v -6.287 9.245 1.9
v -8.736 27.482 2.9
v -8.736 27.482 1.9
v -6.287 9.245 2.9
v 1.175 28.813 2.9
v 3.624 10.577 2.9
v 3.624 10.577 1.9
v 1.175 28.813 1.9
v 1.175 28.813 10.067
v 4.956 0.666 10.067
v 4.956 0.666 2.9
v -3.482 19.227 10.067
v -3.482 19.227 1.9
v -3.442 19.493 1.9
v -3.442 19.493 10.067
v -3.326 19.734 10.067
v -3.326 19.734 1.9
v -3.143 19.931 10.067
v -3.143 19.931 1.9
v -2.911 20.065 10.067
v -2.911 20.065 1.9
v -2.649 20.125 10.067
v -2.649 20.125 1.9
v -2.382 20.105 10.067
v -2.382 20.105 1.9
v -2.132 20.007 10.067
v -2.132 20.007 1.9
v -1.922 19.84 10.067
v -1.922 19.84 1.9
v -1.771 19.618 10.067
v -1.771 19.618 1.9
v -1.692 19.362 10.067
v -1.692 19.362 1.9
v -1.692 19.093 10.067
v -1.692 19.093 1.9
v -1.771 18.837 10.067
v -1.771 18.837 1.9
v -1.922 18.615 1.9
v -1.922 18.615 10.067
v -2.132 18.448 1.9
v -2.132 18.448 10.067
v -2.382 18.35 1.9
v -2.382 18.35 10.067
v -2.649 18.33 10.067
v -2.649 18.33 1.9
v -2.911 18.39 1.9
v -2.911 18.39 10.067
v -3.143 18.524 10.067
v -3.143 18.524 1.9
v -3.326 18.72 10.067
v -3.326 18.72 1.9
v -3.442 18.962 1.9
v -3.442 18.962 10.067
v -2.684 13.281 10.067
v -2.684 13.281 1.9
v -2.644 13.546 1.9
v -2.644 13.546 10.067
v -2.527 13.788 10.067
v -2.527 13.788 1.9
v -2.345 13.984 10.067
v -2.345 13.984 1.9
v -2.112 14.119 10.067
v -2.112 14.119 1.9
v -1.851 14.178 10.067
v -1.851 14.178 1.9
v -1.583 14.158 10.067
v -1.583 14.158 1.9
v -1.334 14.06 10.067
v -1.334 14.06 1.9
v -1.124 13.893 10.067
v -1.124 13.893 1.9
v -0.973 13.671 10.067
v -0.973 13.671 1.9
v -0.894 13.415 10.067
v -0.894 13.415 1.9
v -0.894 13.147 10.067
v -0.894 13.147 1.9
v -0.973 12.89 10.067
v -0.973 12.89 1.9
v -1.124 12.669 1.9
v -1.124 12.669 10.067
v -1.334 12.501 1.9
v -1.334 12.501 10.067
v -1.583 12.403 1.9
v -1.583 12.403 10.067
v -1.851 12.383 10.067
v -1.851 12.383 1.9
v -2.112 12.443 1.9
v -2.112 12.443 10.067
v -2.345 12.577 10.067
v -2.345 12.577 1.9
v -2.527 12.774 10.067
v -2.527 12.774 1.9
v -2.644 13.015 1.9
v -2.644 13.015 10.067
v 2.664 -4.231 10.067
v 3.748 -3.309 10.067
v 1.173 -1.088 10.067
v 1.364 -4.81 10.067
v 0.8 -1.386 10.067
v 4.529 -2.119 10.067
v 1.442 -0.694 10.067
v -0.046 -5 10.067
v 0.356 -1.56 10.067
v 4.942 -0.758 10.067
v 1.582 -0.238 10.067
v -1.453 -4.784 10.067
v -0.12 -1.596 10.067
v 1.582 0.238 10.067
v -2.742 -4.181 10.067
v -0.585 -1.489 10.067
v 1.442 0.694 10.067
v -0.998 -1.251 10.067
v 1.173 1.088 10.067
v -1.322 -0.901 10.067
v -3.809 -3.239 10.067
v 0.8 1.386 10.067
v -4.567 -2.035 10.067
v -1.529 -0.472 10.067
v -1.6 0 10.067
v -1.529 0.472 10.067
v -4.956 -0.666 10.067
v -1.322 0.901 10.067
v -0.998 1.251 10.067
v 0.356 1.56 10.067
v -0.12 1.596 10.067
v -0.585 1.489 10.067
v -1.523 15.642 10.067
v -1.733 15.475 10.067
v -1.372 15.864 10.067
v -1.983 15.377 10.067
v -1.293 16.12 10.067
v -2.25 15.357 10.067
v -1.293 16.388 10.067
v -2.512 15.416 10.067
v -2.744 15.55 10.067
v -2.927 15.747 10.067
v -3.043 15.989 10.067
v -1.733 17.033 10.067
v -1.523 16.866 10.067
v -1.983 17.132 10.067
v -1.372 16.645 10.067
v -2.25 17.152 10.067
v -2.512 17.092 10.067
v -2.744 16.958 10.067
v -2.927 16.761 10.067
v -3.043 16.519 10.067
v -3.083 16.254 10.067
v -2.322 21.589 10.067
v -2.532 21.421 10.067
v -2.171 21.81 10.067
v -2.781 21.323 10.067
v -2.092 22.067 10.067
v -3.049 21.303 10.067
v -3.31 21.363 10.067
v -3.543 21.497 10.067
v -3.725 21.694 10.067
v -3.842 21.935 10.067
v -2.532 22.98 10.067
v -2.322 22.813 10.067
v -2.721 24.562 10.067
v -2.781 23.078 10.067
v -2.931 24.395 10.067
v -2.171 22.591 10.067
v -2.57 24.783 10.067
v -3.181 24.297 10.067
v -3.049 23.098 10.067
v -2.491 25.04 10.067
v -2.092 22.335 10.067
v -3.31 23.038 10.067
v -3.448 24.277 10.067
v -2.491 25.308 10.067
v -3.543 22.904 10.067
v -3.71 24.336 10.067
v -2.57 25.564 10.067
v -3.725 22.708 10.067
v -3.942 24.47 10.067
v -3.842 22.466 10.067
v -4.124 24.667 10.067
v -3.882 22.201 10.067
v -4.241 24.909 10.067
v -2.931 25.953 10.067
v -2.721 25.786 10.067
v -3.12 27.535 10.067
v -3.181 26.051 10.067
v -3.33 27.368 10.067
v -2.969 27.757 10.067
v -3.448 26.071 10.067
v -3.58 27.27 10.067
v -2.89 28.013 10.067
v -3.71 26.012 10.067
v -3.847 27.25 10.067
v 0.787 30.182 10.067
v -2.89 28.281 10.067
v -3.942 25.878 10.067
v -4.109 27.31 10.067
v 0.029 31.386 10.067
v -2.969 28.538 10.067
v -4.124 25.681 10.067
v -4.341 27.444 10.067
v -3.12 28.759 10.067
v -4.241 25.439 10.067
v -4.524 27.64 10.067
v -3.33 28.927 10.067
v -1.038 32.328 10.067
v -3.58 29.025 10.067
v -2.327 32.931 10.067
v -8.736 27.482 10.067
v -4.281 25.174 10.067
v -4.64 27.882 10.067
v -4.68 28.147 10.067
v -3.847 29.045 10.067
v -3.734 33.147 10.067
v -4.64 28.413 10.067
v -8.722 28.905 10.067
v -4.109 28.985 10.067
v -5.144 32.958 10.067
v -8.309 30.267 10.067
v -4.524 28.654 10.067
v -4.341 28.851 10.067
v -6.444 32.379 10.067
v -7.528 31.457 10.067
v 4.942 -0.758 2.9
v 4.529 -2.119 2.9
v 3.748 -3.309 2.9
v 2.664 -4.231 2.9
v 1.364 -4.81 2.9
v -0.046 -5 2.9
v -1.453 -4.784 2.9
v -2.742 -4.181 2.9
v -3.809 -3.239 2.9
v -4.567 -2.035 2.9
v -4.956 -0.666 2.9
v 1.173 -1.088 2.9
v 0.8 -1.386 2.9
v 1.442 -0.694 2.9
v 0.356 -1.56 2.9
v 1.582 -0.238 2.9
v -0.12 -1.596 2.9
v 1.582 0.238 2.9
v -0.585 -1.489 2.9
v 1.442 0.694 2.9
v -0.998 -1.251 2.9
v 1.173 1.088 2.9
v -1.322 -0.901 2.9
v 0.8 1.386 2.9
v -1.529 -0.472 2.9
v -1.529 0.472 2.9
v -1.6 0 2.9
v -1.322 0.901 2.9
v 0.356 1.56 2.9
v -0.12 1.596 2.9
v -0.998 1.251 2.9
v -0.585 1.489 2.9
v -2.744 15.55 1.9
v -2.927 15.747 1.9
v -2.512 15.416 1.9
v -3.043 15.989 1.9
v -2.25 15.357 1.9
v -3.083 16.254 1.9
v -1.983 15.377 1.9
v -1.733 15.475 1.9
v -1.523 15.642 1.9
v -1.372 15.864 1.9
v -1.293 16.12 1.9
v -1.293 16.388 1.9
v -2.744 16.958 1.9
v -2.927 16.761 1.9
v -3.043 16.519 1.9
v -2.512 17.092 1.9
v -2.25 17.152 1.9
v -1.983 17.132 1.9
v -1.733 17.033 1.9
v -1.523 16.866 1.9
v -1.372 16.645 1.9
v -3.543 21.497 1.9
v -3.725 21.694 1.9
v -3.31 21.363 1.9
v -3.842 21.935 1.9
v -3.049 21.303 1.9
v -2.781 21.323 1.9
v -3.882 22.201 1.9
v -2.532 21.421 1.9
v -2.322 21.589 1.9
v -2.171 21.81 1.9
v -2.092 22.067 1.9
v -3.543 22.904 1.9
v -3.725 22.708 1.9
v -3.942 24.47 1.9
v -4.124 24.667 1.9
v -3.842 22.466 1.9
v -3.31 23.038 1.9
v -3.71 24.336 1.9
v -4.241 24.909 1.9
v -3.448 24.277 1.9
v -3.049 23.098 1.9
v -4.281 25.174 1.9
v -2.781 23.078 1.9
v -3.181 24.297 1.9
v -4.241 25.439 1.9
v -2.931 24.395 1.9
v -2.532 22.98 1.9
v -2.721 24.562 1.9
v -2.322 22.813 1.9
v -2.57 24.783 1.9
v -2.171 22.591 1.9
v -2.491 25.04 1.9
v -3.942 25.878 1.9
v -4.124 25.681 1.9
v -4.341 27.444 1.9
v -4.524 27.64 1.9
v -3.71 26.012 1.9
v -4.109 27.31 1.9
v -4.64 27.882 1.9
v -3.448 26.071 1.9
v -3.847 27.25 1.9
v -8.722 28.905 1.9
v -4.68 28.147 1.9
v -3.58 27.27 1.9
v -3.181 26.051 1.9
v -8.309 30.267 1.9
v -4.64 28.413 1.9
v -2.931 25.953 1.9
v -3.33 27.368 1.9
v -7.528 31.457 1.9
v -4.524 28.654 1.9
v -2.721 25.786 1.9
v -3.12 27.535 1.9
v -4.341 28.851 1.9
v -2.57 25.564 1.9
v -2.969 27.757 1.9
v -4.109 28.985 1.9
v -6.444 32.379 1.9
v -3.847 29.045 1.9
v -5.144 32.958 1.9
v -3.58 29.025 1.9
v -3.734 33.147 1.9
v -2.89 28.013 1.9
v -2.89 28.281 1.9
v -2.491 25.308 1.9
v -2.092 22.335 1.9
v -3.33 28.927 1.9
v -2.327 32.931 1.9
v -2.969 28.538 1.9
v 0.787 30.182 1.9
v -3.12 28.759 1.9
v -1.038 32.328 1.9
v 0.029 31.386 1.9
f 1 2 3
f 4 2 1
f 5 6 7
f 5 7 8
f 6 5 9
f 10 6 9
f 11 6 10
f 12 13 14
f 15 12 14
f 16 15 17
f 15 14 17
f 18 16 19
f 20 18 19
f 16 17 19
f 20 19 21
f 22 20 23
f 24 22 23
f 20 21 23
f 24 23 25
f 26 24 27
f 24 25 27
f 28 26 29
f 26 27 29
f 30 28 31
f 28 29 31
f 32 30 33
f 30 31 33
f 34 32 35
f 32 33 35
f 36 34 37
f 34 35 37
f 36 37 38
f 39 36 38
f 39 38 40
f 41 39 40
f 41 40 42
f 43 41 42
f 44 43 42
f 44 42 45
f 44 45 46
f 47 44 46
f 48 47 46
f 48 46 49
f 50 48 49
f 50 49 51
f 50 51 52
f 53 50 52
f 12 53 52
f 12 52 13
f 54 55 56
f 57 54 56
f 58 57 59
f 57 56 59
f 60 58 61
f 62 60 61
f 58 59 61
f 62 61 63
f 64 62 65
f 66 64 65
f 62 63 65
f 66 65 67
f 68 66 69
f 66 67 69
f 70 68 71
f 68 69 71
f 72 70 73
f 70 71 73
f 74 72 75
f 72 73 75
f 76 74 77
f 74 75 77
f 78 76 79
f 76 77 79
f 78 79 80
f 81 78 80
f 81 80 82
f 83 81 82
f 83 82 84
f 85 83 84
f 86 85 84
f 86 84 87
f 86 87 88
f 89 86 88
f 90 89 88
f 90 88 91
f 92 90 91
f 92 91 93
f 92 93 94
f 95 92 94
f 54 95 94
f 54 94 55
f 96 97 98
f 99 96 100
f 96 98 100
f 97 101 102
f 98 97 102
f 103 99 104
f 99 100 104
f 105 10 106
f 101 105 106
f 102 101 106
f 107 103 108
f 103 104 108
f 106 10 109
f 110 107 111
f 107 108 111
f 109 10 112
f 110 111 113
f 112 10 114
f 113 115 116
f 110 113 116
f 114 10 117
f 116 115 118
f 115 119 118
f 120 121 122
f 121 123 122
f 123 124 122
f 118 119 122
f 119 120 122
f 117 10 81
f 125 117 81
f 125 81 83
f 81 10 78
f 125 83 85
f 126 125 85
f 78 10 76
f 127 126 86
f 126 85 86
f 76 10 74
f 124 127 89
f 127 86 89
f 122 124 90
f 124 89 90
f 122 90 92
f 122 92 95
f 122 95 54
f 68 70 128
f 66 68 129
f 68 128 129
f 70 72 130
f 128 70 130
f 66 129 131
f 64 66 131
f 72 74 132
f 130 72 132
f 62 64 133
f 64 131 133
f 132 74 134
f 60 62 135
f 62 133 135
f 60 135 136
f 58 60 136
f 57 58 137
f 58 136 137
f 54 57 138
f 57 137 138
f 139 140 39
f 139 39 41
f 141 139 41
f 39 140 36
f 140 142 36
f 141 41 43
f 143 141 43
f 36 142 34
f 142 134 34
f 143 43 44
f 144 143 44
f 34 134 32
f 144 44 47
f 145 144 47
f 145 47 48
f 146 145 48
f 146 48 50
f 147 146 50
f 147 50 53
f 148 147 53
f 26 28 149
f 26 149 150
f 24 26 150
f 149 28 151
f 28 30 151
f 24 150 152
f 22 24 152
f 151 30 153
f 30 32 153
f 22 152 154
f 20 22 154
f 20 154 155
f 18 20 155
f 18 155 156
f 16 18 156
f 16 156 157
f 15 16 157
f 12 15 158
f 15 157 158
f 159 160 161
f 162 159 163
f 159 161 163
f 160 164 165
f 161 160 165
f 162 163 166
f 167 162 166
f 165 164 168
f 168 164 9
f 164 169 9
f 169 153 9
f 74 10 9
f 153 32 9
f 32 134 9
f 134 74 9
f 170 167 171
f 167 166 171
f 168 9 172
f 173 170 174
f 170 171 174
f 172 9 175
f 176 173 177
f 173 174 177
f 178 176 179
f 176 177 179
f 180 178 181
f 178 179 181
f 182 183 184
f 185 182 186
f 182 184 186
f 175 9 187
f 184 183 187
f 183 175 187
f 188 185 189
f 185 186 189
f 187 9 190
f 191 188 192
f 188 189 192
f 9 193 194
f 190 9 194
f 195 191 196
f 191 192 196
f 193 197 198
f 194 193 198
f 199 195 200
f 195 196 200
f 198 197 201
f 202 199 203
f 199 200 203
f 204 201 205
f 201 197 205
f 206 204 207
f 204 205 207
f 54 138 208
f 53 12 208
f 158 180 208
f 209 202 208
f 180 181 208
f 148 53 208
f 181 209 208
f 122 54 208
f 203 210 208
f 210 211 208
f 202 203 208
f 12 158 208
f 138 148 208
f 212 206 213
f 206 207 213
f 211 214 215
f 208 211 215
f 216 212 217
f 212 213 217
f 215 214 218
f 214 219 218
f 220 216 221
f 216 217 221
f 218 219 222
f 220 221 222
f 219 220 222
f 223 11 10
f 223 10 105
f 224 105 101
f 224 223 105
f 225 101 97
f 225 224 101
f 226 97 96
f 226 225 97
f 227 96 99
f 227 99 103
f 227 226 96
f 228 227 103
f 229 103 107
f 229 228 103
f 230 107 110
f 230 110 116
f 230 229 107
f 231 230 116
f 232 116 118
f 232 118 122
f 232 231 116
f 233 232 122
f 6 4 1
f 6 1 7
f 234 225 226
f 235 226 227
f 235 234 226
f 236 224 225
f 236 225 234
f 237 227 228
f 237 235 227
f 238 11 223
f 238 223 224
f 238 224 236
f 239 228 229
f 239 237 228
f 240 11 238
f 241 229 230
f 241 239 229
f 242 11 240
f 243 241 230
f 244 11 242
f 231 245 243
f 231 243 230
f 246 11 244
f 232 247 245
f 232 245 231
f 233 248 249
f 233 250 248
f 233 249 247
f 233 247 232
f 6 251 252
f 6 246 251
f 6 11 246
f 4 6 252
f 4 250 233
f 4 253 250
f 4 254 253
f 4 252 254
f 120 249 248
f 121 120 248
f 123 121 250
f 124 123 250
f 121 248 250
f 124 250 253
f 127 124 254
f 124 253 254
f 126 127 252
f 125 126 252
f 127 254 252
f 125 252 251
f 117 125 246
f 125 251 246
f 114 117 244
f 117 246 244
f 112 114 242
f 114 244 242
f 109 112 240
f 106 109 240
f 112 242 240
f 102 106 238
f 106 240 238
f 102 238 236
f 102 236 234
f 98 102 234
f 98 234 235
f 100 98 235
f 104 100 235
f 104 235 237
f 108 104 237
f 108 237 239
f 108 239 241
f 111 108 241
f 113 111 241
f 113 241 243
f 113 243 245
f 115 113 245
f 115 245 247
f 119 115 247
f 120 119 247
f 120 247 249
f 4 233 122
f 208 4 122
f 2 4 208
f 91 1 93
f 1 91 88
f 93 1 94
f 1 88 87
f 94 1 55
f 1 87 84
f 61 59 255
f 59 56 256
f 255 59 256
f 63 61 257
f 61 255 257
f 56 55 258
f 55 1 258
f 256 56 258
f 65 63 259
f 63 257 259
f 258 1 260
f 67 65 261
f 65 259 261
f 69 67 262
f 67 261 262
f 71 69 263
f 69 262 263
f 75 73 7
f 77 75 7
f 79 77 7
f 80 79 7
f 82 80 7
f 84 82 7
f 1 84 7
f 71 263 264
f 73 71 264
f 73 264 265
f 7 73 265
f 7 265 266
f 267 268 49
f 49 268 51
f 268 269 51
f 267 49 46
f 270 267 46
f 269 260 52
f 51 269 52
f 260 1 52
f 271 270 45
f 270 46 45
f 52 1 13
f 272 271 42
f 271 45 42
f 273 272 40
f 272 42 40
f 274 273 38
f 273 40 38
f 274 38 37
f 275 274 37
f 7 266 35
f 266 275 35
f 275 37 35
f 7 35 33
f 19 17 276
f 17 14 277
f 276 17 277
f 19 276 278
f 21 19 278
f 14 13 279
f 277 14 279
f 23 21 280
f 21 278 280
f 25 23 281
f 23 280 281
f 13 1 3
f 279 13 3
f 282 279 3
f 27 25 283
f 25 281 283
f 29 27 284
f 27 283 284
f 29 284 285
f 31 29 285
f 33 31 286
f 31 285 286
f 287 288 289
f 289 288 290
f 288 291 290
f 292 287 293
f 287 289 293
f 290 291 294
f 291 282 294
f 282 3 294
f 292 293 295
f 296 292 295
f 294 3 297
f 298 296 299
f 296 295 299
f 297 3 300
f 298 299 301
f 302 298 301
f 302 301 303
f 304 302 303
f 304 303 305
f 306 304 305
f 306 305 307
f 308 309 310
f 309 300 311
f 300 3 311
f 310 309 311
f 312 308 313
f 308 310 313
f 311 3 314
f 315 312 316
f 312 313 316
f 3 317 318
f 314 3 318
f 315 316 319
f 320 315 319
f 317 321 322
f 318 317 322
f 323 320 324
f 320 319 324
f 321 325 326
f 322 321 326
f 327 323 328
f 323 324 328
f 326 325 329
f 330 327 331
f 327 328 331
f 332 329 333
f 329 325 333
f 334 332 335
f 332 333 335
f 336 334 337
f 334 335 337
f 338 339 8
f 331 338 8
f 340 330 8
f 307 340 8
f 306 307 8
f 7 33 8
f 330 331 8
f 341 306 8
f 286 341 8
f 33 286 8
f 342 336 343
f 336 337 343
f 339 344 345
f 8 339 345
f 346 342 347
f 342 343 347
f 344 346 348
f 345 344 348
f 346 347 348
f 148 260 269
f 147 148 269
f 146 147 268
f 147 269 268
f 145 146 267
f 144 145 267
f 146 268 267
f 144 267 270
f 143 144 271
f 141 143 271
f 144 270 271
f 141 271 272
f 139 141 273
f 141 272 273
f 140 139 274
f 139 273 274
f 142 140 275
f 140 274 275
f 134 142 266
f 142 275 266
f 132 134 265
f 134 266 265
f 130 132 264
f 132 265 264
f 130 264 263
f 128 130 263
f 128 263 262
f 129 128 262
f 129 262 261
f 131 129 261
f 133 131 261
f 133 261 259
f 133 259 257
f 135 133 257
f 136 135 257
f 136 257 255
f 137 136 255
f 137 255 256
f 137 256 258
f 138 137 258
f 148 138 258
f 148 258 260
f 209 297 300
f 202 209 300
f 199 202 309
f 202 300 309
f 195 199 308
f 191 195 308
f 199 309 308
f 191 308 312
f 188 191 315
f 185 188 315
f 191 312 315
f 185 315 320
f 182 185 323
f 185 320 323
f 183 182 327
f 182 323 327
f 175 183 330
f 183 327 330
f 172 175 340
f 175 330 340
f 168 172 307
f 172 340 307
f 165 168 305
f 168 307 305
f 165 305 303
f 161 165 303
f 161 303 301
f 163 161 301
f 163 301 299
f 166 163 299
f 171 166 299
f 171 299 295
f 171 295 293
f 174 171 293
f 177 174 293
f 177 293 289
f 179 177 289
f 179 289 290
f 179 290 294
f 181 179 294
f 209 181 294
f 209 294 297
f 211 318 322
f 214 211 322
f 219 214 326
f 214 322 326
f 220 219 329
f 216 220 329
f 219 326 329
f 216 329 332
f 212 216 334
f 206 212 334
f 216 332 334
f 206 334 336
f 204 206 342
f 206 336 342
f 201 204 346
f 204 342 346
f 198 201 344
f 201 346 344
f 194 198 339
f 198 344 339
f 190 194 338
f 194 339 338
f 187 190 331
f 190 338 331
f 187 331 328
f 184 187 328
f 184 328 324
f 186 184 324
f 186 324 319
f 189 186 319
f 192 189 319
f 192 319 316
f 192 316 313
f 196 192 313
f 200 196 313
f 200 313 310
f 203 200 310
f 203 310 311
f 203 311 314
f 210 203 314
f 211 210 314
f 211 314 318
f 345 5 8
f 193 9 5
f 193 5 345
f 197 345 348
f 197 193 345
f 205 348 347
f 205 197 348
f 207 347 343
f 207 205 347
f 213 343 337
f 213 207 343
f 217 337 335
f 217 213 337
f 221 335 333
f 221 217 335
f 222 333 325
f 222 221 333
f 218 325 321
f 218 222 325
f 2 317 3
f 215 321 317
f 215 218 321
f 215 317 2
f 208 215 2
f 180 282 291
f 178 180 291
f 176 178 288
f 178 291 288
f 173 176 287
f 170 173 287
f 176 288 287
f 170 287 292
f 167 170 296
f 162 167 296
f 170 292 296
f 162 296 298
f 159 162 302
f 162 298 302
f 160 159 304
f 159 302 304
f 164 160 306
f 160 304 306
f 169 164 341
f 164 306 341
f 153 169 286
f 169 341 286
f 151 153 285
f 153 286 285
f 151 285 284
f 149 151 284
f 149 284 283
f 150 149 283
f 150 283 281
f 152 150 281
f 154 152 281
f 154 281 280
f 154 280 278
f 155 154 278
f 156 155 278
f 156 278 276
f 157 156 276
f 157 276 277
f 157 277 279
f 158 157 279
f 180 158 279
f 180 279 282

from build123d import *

# Parameters (mm, degrees)
BOSS_EXTRUDE1_START = 2.9
BOSS_EXTRUDE1_DEPTH = 7.167067
BOSS_EXTRUDE2_DEPTH = 1
CUT_EXTRUDE1_REACH  = 10.167
SKETCH3_R           = 0.9
CUT_EXTRUDE2_REACH  = 9.167
SKETCH4_R           = 1.6


with BuildPart() as part:
    # Sketch1 → Boss-Extrude1 (new body)
    with BuildSketch(Plane.XY.offset(BOSS_EXTRUDE1_START)):
        with BuildLine():
            Line((-4.955510048, -0.665522472), (-8.73567769, 27.481774602))
            ThreePointArc((-8.73567769, 27.481774602), (-4.445690114, 33.102807123), (1.175342406, 28.812819547))
            Line((1.175342406, 28.812819547), (4.955510048, 0.665522472))
            ThreePointArc((4.955510048, 0.665522472), (0.665522472, -4.955510048), (-4.955510048, -0.665522472))
        make_face()
    extrude(amount=BOSS_EXTRUDE1_DEPTH)

    # Sketch2 → Boss-Extrude2 (add)
    with BuildSketch(Plane(origin=(0, 0, 2.9), x_dir=(-1, 0, 0), z_dir=(0, 0, -1))):
        with BuildLine():
            Line((-3.624465104, 10.576542569), (-1.175342406, 28.812819547))
            ThreePointArc((-1.175342406, 28.812819547), (4.445690114, 33.102807123), (8.73567769, 27.481774602))
            Line((8.73567769, 27.481774602), (6.286554993, 9.245497624))
            Line((6.286554993, 9.245497624), (-3.624465104, 10.576542569))
        make_face()
    extrude(amount=BOSS_EXTRUDE2_DEPTH)

    # Sketch3 → Cut-Extrude1 (cut, up to next)
    with BuildSketch(Plane(origin=(0, 0, 1.9), x_dir=(-1, 0, 0), z_dir=(0, 0, -1)), mode=Mode.PRIVATE) as cut_extrude1_sk1:
        with Locations((3.780167642, 28.147297074)):
            Circle(SKETCH3_R)
    cut_extrude1_tool1 = extrude(cut_extrude1_sk1.sketch, amount=-CUT_EXTRUDE1_REACH, mode=Mode.PRIVATE) & part.part
    add(cut_extrude1_tool1.solids().sort_by_distance((-3.780168, 28.147297, 1.9))[0], mode=Mode.SUBTRACT)
    # Sketch3 → Cut-Extrude1 (cut, up to next)
    with BuildSketch(Plane(origin=(0, 0, 1.9), x_dir=(-1, 0, 0), z_dir=(0, 0, -1)), mode=Mode.PRIVATE) as cut_extrude1_sk2:
        with Locations((3.380854159, 25.173991045)):
            Circle(SKETCH3_R)
    cut_extrude1_tool2 = extrude(cut_extrude1_sk2.sketch, amount=-CUT_EXTRUDE1_REACH, mode=Mode.PRIVATE) & part.part
    add(cut_extrude1_tool2.solids().sort_by_distance((-3.380854, 25.173991, 1.9))[0], mode=Mode.SUBTRACT)
    # Sketch3 → Cut-Extrude1 (cut, up to next)
    with BuildSketch(Plane(origin=(0, 0, 1.9), x_dir=(-1, 0, 0), z_dir=(0, 0, -1)), mode=Mode.PRIVATE) as cut_extrude1_sk3:
        with Locations((2.981540675, 22.200685016)):
            Circle(SKETCH3_R)
    cut_extrude1_tool3 = extrude(cut_extrude1_sk3.sketch, amount=-CUT_EXTRUDE1_REACH, mode=Mode.PRIVATE) & part.part
    add(cut_extrude1_tool3.solids().sort_by_distance((-2.981541, 22.200685, 1.9))[0], mode=Mode.SUBTRACT)
    # Sketch3 → Cut-Extrude1 (cut, up to next)
    with BuildSketch(Plane(origin=(0, 0, 1.9), x_dir=(-1, 0, 0), z_dir=(0, 0, -1)), mode=Mode.PRIVATE) as cut_extrude1_sk4:
        with Locations((2.582227192, 19.227378987)):
            Circle(SKETCH3_R)
    cut_extrude1_tool4 = extrude(cut_extrude1_sk4.sketch, amount=-CUT_EXTRUDE1_REACH, mode=Mode.PRIVATE) & part.part
    add(cut_extrude1_tool4.solids().sort_by_distance((-2.582227, 19.227379, 1.9))[0], mode=Mode.SUBTRACT)
    # Sketch3 → Cut-Extrude1 (cut, up to next)
    with BuildSketch(Plane(origin=(0, 0, 1.9), x_dir=(-1, 0, 0), z_dir=(0, 0, -1)), mode=Mode.PRIVATE) as cut_extrude1_sk5:
        with Locations((2.182913709, 16.254072958)):
            Circle(SKETCH3_R)
    cut_extrude1_tool5 = extrude(cut_extrude1_sk5.sketch, amount=-CUT_EXTRUDE1_REACH, mode=Mode.PRIVATE) & part.part
    add(cut_extrude1_tool5.solids().sort_by_distance((-2.182914, 16.254073, 1.9))[0], mode=Mode.SUBTRACT)
    # Sketch3 → Cut-Extrude1 (cut, up to next)
    with BuildSketch(Plane(origin=(0, 0, 1.9), x_dir=(-1, 0, 0), z_dir=(0, 0, -1)), mode=Mode.PRIVATE) as cut_extrude1_sk6:
        with Locations((1.783600226, 13.280766929)):
            Circle(SKETCH3_R)
    cut_extrude1_tool6 = extrude(cut_extrude1_sk6.sketch, amount=-CUT_EXTRUDE1_REACH, mode=Mode.PRIVATE) & part.part
    add(cut_extrude1_tool6.solids().sort_by_distance((-1.7836, 13.280767, 1.9))[0], mode=Mode.SUBTRACT)

    # Sketch4 → Cut-Extrude2 (cut, up to next)
    with BuildSketch(Plane(origin=(0, 0, 2.9), x_dir=(-1, 0, 0), z_dir=(0, 0, -1)), mode=Mode.PRIVATE) as cut_extrude2_sk1:
        Circle(SKETCH4_R)
    cut_extrude2_tool1 = extrude(cut_extrude2_sk1.sketch, amount=-CUT_EXTRUDE2_REACH, mode=Mode.PRIVATE) & part.part
    add(cut_extrude2_tool1.solids().sort_by_distance((0, 0, 2.9))[0], mode=Mode.SUBTRACT)


solid = part.part
